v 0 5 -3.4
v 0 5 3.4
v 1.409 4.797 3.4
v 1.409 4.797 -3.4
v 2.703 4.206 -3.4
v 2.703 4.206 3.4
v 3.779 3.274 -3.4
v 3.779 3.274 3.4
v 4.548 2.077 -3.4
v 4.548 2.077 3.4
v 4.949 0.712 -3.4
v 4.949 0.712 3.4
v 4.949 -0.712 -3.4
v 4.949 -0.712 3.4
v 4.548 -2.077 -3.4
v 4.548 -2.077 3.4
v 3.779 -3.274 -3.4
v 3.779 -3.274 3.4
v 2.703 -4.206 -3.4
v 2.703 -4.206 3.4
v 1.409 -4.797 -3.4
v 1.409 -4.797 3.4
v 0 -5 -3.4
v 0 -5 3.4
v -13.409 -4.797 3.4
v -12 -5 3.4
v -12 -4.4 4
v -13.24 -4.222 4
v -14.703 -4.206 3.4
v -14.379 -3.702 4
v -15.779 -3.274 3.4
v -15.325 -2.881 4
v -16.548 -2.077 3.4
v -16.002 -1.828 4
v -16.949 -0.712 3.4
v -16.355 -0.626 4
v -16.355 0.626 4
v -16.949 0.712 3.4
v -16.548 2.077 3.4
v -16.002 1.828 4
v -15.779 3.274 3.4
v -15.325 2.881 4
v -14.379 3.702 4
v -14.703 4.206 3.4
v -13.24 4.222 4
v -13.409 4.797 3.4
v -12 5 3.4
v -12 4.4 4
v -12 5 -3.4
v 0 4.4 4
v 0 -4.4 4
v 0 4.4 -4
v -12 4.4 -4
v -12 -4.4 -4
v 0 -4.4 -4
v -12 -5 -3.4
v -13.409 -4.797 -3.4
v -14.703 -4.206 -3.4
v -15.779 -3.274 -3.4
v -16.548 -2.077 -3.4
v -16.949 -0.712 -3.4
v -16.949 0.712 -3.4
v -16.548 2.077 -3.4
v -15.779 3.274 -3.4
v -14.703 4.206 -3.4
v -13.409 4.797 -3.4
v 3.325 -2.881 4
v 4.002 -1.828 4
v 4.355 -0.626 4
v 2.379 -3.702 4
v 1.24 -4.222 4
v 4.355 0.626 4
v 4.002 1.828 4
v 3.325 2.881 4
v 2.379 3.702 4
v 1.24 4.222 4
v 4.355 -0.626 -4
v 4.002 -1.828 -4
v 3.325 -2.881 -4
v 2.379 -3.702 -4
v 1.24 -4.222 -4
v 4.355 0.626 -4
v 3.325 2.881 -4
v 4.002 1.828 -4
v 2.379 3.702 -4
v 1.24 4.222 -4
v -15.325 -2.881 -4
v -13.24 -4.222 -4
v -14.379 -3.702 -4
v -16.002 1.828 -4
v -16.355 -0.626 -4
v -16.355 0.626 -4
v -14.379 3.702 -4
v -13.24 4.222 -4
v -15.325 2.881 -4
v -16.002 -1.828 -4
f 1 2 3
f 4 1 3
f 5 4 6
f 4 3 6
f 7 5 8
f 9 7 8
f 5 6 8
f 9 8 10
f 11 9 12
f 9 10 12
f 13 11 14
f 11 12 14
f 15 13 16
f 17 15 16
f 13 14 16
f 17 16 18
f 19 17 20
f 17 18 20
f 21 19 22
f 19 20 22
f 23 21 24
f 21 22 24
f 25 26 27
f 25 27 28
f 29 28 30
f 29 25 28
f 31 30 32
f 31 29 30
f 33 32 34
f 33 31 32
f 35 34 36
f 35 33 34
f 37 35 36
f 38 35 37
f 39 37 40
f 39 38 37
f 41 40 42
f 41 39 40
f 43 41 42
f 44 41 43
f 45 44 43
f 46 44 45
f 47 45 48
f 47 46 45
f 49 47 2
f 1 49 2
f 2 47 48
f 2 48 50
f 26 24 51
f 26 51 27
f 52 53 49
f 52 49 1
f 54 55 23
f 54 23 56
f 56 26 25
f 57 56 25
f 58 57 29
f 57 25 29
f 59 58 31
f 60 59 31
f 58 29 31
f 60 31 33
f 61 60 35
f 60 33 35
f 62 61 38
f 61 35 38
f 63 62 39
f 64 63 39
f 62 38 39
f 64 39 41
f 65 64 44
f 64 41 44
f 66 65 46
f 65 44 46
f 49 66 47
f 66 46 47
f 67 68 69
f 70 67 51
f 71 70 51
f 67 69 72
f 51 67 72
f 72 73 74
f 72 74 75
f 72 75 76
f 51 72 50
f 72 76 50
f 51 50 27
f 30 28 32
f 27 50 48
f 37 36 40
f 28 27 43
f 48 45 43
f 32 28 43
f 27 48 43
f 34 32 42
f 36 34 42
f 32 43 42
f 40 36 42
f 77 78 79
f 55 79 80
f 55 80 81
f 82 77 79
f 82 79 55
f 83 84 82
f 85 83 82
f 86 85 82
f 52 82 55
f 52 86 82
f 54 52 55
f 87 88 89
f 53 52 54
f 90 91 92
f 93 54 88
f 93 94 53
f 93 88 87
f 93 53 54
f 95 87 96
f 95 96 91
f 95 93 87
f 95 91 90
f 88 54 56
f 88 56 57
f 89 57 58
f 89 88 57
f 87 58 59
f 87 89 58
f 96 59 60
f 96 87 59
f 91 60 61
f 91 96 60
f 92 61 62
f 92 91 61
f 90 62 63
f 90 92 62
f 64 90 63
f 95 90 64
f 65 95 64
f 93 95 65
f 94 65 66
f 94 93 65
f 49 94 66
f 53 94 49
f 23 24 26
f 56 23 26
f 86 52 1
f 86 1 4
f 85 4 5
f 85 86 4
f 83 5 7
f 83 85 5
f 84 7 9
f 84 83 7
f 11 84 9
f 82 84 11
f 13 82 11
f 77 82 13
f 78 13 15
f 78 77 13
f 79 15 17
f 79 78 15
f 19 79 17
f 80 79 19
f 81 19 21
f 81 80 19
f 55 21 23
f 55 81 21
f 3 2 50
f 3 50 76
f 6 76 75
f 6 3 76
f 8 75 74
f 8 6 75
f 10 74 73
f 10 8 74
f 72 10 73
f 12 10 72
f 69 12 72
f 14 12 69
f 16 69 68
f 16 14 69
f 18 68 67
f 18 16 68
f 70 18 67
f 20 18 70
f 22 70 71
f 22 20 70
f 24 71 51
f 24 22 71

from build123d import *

# Parameters (mm, degrees)
BASEKEY_DEPTH = 4
CHAMFER1_SIZE = 0.6


with BuildPart() as part:
    # Sketch1 → BaseKey (new, symmetric)
    with BuildSketch(Plane.XY):
        with BuildLine():
            Line((-12, 5), (0, 5))
            ThreePointArc((0, 5), (5, 0), (0, -5))
            Line((0, -5), (-12, -5))
            ThreePointArc((-12, -5), (-17, 0), (-12, 5))
        make_face()
    extrude(amount=BASEKEY_DEPTH, both=True)

    # Chamfer1
    chamfer1_edges = [part.edges().sort_by_distance(p)[0] for p in [
        (5, 0, 4),
        (-6, 5, 4),
        (-17, 0, 4),
        (-6, 5, -4),
        (5, 0, -4),
        (-6, -5, -4),
        (-17, 0, -4),
        (-6, -5, 4),
    ]]
    chamfer(chamfer1_edges, length=CHAMFER1_SIZE)


solid = part.part
